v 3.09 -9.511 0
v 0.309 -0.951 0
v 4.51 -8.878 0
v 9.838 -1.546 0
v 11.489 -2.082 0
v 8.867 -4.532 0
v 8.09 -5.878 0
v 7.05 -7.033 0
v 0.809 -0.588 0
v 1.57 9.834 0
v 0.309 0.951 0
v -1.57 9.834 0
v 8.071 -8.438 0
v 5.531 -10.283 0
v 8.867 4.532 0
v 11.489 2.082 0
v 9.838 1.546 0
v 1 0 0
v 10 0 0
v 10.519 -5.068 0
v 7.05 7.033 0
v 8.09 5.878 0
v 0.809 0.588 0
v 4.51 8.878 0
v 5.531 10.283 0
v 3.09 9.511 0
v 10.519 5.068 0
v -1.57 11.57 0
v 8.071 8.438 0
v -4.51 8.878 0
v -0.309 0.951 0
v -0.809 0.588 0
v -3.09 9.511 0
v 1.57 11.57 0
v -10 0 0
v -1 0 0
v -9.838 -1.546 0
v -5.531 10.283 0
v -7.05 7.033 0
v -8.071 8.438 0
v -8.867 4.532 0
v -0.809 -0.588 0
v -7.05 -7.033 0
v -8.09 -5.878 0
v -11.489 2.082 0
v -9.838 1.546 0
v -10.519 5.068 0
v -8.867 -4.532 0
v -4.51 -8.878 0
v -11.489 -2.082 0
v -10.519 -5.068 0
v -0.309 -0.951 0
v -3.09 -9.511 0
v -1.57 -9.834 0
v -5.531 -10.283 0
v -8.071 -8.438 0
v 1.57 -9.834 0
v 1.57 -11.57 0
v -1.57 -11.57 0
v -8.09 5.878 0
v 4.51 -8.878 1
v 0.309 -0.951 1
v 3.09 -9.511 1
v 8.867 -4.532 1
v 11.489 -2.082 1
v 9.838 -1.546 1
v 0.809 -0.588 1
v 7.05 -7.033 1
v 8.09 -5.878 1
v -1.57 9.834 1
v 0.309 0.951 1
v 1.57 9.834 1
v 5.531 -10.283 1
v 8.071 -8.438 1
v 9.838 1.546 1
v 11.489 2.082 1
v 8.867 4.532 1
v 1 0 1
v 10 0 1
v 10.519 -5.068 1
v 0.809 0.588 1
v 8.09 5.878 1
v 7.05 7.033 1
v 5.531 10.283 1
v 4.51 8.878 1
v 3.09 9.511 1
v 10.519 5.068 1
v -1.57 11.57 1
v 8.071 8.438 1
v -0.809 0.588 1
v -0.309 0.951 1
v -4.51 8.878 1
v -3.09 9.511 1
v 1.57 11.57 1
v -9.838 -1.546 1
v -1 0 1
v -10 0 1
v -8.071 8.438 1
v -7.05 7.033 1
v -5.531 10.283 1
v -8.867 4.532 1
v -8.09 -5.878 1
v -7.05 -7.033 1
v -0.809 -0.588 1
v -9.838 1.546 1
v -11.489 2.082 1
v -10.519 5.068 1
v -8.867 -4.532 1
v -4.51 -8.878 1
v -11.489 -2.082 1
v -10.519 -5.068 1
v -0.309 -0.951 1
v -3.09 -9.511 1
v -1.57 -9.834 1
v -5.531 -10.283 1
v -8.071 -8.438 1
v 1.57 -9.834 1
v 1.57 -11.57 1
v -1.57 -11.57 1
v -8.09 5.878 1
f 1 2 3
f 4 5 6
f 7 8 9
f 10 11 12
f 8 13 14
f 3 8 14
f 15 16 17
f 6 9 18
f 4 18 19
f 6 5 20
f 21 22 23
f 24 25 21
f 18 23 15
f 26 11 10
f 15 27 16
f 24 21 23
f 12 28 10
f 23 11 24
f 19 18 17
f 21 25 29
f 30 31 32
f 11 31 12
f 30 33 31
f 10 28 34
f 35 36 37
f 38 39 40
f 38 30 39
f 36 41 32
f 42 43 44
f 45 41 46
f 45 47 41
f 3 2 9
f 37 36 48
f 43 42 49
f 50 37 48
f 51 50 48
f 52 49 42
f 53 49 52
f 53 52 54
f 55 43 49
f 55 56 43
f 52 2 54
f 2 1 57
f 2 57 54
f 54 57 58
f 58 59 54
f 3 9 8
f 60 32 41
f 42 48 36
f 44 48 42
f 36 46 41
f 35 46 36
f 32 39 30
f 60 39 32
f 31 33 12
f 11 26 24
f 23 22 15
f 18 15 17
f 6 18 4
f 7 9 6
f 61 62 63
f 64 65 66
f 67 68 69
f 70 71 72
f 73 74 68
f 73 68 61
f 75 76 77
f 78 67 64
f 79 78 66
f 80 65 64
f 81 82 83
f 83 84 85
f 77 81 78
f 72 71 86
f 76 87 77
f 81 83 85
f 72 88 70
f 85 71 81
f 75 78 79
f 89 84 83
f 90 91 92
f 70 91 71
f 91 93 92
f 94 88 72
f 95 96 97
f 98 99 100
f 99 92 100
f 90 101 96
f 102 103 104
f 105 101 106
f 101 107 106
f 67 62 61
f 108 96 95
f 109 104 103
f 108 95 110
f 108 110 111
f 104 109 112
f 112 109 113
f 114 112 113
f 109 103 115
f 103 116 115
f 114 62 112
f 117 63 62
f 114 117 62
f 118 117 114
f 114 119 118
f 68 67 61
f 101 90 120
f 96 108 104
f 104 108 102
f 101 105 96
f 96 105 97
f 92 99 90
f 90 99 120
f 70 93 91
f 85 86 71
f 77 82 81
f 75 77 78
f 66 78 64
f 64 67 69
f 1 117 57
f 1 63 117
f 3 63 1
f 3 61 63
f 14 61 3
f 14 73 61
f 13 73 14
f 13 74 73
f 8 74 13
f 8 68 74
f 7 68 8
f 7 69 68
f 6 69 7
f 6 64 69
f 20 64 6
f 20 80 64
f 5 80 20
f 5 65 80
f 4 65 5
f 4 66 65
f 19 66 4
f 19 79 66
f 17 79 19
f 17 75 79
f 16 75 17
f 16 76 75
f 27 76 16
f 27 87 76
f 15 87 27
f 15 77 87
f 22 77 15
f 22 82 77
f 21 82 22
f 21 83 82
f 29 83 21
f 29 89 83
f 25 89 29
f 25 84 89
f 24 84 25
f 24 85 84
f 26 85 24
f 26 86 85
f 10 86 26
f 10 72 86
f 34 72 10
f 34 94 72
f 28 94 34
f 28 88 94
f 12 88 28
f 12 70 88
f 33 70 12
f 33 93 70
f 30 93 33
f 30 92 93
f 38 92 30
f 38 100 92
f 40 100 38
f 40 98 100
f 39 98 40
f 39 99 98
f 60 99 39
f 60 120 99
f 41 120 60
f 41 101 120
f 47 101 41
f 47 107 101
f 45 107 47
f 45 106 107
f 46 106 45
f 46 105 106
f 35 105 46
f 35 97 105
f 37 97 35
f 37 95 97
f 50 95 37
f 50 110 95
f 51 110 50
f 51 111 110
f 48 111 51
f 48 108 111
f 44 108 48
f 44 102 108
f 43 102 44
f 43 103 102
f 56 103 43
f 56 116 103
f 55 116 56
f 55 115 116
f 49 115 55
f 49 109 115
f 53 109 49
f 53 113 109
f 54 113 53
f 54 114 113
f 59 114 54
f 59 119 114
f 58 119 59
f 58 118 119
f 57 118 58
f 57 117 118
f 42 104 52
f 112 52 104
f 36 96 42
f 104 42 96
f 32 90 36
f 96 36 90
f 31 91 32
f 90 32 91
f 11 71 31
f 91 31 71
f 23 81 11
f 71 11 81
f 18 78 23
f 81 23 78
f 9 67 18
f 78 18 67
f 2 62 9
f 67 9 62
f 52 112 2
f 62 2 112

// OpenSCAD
module engranatge(radi,n_dents,h){
    linear_extrude(h){
        union(){
            difference() {
                 
                circle(radi);
               circle(radi/10,$fn=radi);
            }
        for(a=[0: n_dents-1]){
            angle = a * 360 / n_dents;
            translate(radi * [sin(angle), -cos(angle), 0])
                rotate([0, 0, angle]){
                    square((3.14*radi)/n_dents,center=true);
                    }
            
            }
        }
    }
}
//mig quadrat esta a dins el cercle
//no te altura(linear_extrude(height=))

    engranatge(10,10,1);
